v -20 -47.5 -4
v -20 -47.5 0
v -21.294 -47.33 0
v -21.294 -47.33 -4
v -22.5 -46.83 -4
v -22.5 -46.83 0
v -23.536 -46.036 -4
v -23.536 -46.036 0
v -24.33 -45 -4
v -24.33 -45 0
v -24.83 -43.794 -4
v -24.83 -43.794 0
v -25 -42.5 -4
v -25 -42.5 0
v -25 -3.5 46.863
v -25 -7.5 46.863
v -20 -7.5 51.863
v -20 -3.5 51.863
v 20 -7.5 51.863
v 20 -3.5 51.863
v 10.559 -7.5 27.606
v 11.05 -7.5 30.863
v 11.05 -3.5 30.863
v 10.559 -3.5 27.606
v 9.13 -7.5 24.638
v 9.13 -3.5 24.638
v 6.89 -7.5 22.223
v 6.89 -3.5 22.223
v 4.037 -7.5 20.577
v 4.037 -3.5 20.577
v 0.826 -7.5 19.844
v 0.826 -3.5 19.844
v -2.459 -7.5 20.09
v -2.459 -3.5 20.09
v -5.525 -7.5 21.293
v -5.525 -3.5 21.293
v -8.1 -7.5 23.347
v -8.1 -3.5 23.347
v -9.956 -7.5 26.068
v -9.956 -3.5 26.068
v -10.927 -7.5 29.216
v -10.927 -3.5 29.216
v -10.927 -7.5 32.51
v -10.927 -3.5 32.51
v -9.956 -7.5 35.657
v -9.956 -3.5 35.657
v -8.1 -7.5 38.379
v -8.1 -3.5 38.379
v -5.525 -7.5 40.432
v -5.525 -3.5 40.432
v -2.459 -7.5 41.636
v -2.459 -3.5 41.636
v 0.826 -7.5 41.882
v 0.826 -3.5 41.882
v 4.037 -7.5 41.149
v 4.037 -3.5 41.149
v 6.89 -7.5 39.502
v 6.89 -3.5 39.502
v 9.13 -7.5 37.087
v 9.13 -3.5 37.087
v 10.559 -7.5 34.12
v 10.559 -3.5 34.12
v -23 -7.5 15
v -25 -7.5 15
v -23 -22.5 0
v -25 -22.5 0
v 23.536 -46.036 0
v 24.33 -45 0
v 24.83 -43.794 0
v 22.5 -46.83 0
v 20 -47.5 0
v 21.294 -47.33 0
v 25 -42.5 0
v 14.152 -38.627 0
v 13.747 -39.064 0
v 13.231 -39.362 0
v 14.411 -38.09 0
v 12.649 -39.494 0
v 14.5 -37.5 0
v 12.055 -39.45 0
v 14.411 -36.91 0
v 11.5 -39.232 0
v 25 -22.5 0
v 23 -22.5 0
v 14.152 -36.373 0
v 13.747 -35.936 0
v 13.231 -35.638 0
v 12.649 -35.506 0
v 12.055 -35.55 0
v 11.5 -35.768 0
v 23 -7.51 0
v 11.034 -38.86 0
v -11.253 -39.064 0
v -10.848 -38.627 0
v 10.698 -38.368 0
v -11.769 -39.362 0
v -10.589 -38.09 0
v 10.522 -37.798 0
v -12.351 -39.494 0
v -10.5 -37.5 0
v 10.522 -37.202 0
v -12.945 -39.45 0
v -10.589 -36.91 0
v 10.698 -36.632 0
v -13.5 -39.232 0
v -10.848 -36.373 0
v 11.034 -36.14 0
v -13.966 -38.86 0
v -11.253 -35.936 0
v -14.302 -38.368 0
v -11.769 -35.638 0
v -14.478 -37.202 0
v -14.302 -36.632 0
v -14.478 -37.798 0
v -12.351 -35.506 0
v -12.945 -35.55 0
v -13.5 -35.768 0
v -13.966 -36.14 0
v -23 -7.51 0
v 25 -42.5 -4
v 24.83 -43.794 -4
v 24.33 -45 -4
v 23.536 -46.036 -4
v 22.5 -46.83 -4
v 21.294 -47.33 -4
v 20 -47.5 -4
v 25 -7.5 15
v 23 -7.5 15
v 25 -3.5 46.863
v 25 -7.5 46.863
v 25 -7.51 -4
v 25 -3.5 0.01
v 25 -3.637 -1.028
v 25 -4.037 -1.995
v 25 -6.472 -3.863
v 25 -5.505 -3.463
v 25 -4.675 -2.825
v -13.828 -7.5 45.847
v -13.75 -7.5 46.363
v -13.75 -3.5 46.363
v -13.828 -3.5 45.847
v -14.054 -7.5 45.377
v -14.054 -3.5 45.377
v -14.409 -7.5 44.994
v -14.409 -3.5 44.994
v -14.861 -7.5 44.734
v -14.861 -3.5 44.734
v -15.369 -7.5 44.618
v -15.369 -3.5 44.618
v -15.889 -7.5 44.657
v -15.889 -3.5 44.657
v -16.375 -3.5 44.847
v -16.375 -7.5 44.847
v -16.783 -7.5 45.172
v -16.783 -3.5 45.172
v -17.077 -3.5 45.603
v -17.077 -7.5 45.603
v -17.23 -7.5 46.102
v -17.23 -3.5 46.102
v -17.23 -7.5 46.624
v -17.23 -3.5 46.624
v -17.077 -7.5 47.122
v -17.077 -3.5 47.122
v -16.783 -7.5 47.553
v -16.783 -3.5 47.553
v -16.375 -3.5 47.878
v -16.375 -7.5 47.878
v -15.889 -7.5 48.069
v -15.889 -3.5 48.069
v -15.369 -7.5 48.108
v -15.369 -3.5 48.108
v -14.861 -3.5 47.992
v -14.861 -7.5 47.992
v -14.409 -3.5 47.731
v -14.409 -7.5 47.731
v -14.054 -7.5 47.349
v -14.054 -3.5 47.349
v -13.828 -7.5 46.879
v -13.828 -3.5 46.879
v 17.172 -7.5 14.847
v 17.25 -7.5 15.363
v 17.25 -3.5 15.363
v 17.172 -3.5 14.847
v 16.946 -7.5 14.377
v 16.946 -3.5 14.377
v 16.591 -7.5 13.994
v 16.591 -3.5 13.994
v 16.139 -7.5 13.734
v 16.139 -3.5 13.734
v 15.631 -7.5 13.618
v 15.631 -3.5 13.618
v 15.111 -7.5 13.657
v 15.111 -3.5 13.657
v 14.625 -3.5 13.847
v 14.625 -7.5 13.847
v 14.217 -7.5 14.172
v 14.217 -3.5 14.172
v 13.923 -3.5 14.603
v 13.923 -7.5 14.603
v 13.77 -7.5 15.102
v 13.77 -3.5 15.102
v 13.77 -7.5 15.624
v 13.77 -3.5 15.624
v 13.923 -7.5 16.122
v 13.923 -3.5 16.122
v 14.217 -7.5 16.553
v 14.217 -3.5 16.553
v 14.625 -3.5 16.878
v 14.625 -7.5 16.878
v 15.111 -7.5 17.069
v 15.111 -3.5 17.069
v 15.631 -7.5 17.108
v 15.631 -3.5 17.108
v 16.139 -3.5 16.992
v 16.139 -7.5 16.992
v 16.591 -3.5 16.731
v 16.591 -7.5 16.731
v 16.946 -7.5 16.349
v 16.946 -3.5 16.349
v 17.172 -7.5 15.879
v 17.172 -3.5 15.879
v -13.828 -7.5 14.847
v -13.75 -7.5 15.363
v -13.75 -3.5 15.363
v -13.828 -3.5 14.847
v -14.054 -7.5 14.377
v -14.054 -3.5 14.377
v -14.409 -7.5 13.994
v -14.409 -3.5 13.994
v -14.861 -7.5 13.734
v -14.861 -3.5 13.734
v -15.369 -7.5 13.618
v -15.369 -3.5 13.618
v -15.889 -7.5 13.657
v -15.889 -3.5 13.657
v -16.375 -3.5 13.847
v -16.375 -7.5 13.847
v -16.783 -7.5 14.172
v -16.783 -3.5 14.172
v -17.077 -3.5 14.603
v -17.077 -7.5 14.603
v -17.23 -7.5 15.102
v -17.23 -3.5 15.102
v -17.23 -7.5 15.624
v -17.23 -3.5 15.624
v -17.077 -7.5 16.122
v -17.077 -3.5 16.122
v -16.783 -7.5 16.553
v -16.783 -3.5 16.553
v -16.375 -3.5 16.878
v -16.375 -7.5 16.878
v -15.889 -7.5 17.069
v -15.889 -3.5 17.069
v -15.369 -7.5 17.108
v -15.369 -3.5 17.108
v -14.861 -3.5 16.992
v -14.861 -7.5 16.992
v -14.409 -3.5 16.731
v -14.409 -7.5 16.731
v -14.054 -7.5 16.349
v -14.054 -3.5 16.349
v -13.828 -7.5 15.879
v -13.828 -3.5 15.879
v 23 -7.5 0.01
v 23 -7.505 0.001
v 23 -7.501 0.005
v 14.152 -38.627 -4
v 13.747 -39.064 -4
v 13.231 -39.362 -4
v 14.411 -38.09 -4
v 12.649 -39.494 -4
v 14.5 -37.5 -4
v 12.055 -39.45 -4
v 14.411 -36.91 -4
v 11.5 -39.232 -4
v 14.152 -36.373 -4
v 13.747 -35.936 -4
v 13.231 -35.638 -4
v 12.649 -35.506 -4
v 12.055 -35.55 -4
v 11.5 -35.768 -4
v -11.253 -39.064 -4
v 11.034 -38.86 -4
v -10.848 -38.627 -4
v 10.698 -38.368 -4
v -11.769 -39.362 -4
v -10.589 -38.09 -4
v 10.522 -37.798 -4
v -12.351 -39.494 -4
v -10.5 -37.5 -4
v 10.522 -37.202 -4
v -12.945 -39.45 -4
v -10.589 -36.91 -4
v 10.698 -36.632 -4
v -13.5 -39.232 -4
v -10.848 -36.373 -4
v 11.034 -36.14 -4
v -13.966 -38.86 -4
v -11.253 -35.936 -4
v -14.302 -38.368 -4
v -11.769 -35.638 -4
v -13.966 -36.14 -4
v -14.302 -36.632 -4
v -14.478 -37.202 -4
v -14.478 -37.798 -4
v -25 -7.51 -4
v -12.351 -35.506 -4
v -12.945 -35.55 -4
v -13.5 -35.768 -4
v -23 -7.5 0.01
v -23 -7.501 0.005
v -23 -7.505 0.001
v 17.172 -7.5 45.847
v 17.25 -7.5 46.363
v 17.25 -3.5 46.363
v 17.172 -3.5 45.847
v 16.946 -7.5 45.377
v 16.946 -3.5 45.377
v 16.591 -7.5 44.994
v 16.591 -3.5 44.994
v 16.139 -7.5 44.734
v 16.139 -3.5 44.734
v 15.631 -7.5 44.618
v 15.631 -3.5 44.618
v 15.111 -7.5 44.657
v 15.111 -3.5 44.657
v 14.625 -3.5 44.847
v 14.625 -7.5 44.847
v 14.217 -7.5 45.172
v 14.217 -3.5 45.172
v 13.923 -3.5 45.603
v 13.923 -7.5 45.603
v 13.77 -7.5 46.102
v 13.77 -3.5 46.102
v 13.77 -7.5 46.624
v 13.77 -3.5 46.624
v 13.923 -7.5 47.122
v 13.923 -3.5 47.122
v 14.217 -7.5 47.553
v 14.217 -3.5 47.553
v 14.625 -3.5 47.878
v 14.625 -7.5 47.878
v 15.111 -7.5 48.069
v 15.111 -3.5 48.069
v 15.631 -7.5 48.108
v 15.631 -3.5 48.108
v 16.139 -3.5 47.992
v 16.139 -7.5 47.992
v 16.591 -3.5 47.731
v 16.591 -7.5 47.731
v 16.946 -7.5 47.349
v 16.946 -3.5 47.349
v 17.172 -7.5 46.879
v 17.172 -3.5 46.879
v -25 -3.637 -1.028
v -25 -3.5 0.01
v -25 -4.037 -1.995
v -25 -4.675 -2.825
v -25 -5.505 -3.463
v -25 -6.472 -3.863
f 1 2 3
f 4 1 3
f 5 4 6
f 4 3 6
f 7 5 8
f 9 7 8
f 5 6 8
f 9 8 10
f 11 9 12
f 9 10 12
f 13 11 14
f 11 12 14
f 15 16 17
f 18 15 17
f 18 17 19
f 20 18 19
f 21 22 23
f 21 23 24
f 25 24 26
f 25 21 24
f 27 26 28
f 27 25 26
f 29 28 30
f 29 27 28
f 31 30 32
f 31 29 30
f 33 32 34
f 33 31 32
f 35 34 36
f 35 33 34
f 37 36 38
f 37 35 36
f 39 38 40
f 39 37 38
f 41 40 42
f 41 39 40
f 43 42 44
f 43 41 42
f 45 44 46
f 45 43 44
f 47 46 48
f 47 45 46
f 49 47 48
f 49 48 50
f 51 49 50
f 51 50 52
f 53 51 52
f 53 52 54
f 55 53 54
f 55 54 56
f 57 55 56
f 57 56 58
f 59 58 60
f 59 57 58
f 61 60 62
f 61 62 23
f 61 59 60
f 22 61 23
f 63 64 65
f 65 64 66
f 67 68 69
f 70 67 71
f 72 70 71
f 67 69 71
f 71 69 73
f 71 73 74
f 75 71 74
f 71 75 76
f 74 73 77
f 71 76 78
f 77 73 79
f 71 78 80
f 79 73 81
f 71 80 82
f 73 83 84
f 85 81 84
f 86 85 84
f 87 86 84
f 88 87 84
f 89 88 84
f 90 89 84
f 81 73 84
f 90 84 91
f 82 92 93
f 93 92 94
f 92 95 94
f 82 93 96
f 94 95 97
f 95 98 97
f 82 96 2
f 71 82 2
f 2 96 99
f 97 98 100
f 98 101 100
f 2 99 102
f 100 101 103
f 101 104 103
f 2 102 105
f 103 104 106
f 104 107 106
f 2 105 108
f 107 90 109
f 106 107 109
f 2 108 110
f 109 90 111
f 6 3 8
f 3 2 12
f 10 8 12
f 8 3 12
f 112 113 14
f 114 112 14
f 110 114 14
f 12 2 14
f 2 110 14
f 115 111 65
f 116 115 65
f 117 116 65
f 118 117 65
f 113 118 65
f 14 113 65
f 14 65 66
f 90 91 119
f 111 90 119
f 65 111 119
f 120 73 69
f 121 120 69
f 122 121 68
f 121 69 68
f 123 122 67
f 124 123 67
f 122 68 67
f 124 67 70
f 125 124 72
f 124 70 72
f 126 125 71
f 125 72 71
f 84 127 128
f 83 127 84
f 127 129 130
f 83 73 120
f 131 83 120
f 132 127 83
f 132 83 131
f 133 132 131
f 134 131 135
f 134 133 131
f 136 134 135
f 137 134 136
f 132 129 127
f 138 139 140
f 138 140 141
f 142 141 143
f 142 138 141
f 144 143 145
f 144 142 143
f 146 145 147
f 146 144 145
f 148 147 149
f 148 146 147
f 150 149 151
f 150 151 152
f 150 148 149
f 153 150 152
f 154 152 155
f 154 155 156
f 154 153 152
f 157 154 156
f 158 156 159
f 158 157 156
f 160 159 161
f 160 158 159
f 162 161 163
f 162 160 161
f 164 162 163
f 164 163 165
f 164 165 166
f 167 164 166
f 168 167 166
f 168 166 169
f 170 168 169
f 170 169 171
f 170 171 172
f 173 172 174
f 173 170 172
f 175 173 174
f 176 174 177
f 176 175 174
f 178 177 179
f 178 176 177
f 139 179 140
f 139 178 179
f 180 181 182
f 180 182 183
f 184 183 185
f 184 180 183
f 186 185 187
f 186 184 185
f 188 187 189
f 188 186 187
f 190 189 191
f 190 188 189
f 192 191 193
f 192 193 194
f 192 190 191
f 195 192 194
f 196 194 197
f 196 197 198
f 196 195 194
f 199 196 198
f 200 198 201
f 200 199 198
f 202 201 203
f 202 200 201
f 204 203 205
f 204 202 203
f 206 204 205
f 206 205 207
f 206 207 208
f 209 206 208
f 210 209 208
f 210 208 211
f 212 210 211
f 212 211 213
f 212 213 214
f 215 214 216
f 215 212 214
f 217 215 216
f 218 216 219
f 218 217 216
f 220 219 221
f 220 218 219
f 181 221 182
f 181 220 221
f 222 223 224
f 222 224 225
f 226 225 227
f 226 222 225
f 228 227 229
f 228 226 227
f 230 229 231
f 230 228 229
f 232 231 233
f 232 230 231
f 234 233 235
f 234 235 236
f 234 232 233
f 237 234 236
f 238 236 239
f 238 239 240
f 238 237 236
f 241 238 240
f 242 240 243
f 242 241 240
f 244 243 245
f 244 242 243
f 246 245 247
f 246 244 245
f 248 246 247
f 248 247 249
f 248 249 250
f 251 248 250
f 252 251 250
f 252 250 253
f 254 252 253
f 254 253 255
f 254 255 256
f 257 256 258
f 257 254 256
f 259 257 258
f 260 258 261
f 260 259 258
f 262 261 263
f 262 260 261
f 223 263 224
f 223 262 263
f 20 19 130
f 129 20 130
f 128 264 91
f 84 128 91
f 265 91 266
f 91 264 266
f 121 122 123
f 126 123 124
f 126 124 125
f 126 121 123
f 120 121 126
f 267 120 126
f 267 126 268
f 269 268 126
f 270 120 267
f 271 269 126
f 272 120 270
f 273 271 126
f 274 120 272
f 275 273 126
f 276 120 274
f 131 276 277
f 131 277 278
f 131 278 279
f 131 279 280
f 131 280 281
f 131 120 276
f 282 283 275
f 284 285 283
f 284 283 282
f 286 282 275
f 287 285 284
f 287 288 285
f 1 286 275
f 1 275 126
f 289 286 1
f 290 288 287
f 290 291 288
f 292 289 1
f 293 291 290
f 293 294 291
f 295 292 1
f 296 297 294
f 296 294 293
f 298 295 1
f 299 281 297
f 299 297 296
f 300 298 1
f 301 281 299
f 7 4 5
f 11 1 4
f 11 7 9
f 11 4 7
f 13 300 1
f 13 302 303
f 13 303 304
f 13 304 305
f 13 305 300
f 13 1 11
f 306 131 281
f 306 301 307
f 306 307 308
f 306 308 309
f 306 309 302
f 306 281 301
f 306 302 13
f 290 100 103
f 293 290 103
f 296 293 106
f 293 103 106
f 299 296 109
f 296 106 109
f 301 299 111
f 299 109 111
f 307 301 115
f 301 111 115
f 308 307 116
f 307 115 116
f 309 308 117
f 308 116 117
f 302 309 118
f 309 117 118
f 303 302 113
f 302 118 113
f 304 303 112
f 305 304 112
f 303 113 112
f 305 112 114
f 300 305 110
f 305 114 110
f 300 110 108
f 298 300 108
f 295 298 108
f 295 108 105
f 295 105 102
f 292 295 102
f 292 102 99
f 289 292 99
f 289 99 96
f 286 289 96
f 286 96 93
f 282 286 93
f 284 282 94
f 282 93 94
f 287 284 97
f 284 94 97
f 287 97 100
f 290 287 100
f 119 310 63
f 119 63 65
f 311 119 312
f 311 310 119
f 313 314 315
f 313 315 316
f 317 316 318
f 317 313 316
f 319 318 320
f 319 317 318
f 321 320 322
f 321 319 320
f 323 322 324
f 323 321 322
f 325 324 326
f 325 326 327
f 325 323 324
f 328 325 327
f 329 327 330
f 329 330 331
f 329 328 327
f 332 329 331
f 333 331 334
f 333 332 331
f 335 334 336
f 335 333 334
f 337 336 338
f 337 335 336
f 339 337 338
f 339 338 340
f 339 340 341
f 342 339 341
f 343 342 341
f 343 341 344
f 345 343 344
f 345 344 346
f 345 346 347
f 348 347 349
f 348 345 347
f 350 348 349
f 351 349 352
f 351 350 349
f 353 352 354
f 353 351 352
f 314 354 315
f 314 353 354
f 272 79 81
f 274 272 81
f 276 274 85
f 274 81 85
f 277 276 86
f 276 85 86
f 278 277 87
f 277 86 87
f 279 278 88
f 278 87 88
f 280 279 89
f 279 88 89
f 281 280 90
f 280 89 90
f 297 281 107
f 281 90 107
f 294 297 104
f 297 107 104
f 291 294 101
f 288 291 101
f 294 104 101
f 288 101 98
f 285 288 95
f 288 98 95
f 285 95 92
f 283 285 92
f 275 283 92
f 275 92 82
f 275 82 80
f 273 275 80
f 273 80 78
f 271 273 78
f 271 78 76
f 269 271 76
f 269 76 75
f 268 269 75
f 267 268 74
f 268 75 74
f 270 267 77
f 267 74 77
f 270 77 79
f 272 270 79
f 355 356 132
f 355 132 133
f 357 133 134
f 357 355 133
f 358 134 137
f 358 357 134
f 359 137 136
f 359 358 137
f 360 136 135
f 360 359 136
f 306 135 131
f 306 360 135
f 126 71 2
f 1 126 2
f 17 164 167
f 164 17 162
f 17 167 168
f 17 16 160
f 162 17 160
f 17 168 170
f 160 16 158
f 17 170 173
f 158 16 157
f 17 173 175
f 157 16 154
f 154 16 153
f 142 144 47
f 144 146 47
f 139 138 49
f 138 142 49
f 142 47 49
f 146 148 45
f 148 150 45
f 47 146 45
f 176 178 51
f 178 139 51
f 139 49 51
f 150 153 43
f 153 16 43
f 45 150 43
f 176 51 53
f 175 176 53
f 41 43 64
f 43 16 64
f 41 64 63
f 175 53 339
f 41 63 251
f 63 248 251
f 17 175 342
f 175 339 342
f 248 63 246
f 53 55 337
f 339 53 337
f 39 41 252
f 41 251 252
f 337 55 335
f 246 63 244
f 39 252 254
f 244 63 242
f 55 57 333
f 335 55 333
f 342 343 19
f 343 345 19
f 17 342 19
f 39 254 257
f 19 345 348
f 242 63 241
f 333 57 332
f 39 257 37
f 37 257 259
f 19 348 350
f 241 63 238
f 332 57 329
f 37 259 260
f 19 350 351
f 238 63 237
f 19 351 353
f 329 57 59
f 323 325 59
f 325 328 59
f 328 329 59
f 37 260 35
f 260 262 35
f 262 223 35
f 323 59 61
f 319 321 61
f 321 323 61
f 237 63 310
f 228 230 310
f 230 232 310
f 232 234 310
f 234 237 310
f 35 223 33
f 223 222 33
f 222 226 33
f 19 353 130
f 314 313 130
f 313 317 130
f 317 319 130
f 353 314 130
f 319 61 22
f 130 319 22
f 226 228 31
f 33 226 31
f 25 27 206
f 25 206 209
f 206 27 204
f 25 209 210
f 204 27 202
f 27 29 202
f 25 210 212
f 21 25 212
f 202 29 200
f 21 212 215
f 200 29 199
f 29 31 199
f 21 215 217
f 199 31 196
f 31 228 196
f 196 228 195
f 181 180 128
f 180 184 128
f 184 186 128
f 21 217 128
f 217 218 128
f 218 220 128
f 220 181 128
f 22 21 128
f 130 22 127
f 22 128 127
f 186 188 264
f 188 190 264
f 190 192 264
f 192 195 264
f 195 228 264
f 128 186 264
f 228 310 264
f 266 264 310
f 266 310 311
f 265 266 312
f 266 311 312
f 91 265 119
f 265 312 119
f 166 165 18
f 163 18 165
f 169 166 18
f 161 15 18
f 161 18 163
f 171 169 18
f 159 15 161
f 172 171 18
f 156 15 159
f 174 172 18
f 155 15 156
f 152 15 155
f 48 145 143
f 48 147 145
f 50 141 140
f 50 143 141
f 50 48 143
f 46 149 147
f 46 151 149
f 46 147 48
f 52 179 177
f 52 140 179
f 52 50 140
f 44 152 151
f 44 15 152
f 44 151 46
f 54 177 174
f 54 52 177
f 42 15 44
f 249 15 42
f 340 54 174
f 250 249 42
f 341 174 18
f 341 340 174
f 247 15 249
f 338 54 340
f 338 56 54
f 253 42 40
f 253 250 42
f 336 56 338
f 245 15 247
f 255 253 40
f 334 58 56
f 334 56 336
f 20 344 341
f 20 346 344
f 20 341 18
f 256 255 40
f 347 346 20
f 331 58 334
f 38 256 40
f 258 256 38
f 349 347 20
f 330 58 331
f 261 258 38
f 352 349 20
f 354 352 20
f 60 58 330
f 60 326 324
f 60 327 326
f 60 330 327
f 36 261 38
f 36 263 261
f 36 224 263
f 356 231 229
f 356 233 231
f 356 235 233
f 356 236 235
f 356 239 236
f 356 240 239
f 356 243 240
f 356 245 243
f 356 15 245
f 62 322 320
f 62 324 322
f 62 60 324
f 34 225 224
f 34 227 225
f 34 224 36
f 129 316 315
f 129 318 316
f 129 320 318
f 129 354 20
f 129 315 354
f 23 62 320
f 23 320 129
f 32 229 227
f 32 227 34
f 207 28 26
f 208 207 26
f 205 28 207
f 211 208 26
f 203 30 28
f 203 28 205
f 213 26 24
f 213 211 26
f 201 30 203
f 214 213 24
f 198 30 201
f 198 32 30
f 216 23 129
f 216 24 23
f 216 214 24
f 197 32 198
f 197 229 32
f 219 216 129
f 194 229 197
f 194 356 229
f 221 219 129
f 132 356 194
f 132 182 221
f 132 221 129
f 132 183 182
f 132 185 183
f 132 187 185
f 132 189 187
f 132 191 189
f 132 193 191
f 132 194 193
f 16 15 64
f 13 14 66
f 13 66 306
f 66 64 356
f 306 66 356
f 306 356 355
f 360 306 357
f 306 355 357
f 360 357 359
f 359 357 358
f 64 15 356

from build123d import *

# Parameters (mm, degrees)
SCHIZZO1_R                             = 1.75
SCHIZZO1_R_2                           = 11.05
SCHIZZO1_R_3                           = 2
BASE_FLANGIA1_DEPTH                    = 4
PIEGATURA_START                        = -3.5
PIEGATURA_DELLO_SCHIZZO1_OUTLINE_W     = 50
PIEGATURA_DELLO_SCHIZZO1_OUTLINE_H     = 4
PIEGATURA_DELLO_SCHIZZO1_DEPTH         = 51
PIEGATURA_START_2                      = -7.5
PIEGATURA_DELLO_SCHIZZO1_2_OUTLINE_R   = 1.75
PIEGATURA_DELLO_SCHIZZO1_2_OUTLINE_R_2 = 11.05
PIEGATURA_DELLO_SCHIZZO1_2_DEPTH       = 4
PIEGATURA_START_3                      = -26
PIEGATURA_DELLO_SCHIZZO1_3_DEPTH       = 52
PIEGATURA_START_4                      = -25
PIEGATURA_DELLO_SCHIZZO1_4_DEPTH       = 50
ESTRUSIONE_ESTRUSIONE1_DEPTH           = 2


with BuildPart() as part:
    # Base-Flangia1: sheet metal written as solids
    # Schizzo1 → Base-Flangia1 (new body)
    with BuildSketch(Plane.XY):
        with BuildLine():
            Line((-25, 42.5), (-20, 47.5))
            Line((-20, 47.5), (20, 47.5))
            Line((20, 47.5), (25, 42.5))
            Line((25, 42.5), (25, -42.5))
            ThreePointArc((25, -42.5), (23.535533906, -46.035533906), (20, -47.5))
            Line((20, -47.5), (-20, -47.5))
            ThreePointArc((-20, -47.5), (-23.535533906, -46.035533906), (-25, -42.5))
            Line((-25, -42.5), (-25, 42.5))
        make_face()
        with Locations((-15.5, 42)):
            Circle(SCHIZZO1_R, mode=Mode.SUBTRACT)
        with Locations((15.5, 42)):
            Circle(SCHIZZO1_R, mode=Mode.SUBTRACT)
        with Locations((15.5, 11)):
            Circle(SCHIZZO1_R, mode=Mode.SUBTRACT)
        with Locations((-15.5, 11)):
            Circle(SCHIZZO1_R, mode=Mode.SUBTRACT)
        with Locations((0, 26.5)):
            Circle(SCHIZZO1_R_2, mode=Mode.SUBTRACT)
        with Locations((-12.5, -37.5)):
            Circle(SCHIZZO1_R_3, mode=Mode.SUBTRACT)
        with Locations((12.5, -37.5)):
            Circle(SCHIZZO1_R_3, mode=Mode.SUBTRACT)
    extrude(amount=-BASE_FLANGIA1_DEPTH)

    # Piegatura dello schizzo1: read off the stored shape, not the designer's step
    # Piegatura dello schizzo1 outline → Piegatura dello schizzo1 (cut)
    with BuildSketch(Plane(origin=(0, 0, 0), x_dir=(1, 0, 0), z_dir=(0, 1, 0)).offset(PIEGATURA_START)):
        with Locations((0, 2)):
            Rectangle(PIEGATURA_DELLO_SCHIZZO1_OUTLINE_W, PIEGATURA_DELLO_SCHIZZO1_OUTLINE_H)
    extrude(amount=PIEGATURA_DELLO_SCHIZZO1_DEPTH, mode=Mode.SUBTRACT)

    # Piegatura dello schizzo1 2 outline → Piegatura dello schizzo1 2 (add)
    with BuildSketch(Plane(origin=(0, 0, 0), x_dir=(1, 0, 0), z_dir=(0, 1, 0)).offset(PIEGATURA_START_2)):
        Polygon((-25, 0), (-25, -46.862699383), (-20, -51.862699383), (20, -51.862699383), (25, -46.862699383), (25, 0), align=None)
        with Locations((-15.5, -46.362699383)):
            Circle(PIEGATURA_DELLO_SCHIZZO1_2_OUTLINE_R, mode=Mode.SUBTRACT)
        with Locations((15.5, -46.362699383)):
            Circle(PIEGATURA_DELLO_SCHIZZO1_2_OUTLINE_R, mode=Mode.SUBTRACT)
        with Locations((0, -30.862699383)):
            Circle(PIEGATURA_DELLO_SCHIZZO1_2_OUTLINE_R_2, mode=Mode.SUBTRACT)
        with Locations((-15.5, -15.362699383)):
            Circle(PIEGATURA_DELLO_SCHIZZO1_2_OUTLINE_R, mode=Mode.SUBTRACT)
        with Locations((15.5, -15.362699383)):
            Circle(PIEGATURA_DELLO_SCHIZZO1_2_OUTLINE_R, mode=Mode.SUBTRACT)
    extrude(amount=PIEGATURA_DELLO_SCHIZZO1_2_DEPTH)

    # Piegatura dello schizzo1 3 outline → Piegatura dello schizzo1 3 (cut)
    with BuildSketch(Plane.YZ.offset(PIEGATURA_START_3)):
        with BuildLine():
            ThreePointArc((-3.5, 0.01), (-4.674501807, -2.825498193), (-7.51, -4))
            Line((-7.51, -4), (-3.5, -4))
            Line((-3.5, -4), (-3.5, 0.01))
        make_face()
    extrude(amount=PIEGATURA_DELLO_SCHIZZO1_3_DEPTH, mode=Mode.SUBTRACT)

    # Piegatura dello schizzo1 4 outline → Piegatura dello schizzo1 4 (add)
    with BuildSketch(Plane.YZ.offset(PIEGATURA_START_4)):
        with BuildLine():
            ThreePointArc((-7.5, 0.01), (-7.502928932, 0.002928932), (-7.51, 0))
            Line((-7.51, 0), (-7.5, 0))
            Line((-7.5, 0), (-7.5, 0.01))
        make_face()
    extrude(amount=PIEGATURA_DELLO_SCHIZZO1_4_DEPTH)

    # Schizzo13 → Estrusione-Estrusione1 (add)
    with BuildSketch(Plane.ZY.offset(25)):
        with BuildLine():
            Line((0.01, -7.5), (15, -7.5))
            Line((15, -7.5), (0, -22.5))
            Line((0, -22.5), (0, -7.51))
            ThreePointArc((0, -7.51), (0.002928932, -7.502928932), (0.01, -7.5))
        make_face()
    estrusione_estrusione1 = extrude(amount=-ESTRUSIONE_ESTRUSIONE1_DEPTH)

    # Specchia1: Estrusione-Estrusione1 across plane
    add(estrusione_estrusione1.mirror(Plane(origin=(0, 0, 0), x_dir=(0, 0, 1), z_dir=(1, 0, 0))))


solid = part.part
